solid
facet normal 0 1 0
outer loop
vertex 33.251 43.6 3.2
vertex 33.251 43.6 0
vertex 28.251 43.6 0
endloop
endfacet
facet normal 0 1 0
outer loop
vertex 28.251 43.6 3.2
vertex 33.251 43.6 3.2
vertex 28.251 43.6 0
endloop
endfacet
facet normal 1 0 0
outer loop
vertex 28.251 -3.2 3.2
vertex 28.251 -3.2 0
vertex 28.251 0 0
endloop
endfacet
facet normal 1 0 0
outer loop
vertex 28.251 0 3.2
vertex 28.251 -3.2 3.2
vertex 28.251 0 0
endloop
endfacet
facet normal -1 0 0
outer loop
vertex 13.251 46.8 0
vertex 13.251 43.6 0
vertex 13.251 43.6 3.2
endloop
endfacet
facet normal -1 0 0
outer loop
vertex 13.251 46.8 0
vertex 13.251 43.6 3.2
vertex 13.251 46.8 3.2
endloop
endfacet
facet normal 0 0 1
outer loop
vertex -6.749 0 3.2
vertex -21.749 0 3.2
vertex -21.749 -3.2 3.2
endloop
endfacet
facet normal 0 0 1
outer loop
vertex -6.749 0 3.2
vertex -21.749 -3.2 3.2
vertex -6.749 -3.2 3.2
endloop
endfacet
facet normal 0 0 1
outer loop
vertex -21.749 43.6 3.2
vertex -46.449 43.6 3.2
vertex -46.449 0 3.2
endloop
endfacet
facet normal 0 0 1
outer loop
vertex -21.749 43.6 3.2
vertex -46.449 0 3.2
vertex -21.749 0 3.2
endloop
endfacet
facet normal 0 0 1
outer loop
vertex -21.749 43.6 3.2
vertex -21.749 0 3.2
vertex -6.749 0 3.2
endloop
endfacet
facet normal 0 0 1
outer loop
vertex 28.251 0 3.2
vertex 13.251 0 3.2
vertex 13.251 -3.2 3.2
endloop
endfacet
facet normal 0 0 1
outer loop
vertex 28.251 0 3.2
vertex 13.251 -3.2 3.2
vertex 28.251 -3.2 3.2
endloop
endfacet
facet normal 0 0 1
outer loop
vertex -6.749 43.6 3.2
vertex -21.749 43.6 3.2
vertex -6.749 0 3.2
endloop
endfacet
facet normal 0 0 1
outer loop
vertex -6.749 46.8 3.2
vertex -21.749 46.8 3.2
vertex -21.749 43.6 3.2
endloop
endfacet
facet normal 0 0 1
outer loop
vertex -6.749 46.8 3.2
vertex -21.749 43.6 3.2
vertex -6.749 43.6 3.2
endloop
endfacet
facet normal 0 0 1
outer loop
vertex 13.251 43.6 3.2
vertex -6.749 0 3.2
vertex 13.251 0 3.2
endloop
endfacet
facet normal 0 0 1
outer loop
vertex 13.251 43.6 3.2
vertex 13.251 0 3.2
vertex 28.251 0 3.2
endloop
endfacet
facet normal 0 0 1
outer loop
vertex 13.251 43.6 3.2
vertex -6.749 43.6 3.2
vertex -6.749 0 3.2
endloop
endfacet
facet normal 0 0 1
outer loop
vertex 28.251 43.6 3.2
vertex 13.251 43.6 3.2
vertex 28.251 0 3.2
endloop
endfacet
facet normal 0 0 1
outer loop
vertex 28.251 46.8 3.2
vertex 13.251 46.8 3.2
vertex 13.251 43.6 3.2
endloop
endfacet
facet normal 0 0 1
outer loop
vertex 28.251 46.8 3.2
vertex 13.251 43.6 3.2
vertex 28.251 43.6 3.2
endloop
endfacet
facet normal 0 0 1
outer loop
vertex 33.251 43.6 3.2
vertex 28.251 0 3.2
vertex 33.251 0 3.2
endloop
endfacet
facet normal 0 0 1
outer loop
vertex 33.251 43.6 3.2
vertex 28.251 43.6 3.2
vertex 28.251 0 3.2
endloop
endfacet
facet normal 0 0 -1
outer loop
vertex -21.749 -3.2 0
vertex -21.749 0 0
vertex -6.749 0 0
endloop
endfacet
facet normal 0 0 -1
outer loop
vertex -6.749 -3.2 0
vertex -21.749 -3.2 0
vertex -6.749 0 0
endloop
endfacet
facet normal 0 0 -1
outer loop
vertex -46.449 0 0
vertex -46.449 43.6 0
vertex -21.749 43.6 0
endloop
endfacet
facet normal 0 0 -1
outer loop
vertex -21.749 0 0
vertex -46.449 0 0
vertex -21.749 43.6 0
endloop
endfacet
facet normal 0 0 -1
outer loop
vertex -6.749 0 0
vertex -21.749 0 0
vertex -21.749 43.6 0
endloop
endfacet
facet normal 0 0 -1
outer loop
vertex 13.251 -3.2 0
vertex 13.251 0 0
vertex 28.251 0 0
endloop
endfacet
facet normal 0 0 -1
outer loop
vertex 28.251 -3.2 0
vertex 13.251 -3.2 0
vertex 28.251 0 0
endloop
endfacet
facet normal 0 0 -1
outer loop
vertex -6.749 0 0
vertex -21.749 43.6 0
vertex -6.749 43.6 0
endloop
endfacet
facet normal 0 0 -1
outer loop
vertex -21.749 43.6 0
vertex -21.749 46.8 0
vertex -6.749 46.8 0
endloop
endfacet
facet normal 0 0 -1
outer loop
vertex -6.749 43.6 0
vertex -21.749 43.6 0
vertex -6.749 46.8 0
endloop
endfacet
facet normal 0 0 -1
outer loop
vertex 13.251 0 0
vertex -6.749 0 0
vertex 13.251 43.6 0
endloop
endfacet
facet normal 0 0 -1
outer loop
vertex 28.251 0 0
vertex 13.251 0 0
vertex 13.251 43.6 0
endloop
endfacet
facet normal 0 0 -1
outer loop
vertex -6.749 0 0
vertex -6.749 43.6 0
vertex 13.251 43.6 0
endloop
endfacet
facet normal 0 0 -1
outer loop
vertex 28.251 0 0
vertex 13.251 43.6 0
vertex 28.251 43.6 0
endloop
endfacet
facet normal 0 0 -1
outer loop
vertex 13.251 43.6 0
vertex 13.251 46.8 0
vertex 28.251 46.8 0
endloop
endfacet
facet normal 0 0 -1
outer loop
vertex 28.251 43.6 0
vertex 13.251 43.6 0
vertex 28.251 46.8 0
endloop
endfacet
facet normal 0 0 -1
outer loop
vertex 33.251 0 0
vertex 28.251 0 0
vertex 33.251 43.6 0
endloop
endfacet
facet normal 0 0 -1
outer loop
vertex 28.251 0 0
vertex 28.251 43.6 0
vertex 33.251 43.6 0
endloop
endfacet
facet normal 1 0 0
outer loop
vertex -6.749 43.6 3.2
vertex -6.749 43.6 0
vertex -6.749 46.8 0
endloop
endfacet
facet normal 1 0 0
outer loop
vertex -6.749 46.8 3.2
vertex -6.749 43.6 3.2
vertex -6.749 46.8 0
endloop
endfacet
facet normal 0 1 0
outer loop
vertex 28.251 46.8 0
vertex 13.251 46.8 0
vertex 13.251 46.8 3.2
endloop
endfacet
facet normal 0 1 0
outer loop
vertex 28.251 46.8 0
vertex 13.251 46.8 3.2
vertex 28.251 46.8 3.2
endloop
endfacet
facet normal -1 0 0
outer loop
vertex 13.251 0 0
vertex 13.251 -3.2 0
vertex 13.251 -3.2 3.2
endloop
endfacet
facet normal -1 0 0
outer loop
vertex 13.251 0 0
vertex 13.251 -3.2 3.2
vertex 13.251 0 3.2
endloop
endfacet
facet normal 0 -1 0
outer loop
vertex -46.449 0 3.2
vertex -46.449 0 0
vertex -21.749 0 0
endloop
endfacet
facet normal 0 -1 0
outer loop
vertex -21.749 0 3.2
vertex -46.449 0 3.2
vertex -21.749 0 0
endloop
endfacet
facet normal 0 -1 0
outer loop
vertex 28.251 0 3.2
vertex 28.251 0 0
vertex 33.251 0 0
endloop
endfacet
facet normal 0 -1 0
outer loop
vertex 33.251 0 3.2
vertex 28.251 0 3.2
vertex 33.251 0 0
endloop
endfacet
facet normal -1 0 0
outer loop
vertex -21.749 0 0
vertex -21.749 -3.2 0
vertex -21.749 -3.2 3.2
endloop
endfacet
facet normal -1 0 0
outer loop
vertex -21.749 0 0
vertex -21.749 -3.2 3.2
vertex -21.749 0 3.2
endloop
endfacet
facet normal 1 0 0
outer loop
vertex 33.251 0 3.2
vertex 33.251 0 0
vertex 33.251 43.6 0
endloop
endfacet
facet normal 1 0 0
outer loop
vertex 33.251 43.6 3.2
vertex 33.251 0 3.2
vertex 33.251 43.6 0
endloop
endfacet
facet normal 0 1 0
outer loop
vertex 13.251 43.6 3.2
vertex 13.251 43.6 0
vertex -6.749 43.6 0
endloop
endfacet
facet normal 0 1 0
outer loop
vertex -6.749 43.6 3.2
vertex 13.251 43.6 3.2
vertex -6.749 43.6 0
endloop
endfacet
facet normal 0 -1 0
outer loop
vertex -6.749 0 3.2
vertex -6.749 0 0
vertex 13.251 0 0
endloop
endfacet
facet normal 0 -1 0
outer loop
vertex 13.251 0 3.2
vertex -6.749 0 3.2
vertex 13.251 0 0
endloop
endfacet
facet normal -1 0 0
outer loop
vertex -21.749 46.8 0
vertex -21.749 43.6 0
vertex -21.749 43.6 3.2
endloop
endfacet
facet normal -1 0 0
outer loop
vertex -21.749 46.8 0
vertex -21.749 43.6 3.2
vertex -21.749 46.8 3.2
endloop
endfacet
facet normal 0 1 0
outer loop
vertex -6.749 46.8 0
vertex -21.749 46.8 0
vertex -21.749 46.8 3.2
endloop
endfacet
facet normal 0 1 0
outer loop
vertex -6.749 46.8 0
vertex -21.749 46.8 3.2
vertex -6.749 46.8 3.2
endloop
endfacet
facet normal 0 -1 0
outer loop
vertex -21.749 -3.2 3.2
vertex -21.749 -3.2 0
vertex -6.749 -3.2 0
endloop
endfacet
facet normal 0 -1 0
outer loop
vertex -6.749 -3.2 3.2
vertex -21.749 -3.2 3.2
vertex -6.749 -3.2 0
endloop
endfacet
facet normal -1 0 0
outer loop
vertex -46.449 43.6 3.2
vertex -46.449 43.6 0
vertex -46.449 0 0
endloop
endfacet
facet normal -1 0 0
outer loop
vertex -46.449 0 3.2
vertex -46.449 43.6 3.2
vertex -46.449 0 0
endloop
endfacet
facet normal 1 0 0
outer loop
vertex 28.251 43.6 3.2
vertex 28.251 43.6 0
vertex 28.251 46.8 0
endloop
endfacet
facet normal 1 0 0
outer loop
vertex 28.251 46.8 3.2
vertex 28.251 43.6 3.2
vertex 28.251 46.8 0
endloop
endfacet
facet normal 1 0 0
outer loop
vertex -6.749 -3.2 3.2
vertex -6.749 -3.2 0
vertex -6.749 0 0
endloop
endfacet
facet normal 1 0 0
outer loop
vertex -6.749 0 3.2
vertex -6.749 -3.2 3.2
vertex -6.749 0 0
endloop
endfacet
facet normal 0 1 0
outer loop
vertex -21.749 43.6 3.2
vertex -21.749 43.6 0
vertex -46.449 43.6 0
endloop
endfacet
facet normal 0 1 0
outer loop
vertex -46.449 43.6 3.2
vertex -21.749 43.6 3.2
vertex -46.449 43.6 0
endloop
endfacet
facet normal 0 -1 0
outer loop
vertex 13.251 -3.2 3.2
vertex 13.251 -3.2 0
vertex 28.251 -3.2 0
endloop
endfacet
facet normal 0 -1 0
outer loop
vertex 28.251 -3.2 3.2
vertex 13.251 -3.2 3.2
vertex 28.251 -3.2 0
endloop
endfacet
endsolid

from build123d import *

# Parameters (mm, degrees)
F0_W     = 15
F0_H     = 3.2
F1_DEPTH = 3.2


with BuildPart() as f1:
    # F0 (on Top) → F1 (new body)
    with BuildSketch(Plane.XY):
        Polygon((28.25105, 0), (33.25105, 0), (33.25105, 43.6), (28.25105, 43.6), (13.25105, 43.6), (-6.74895, 43.6), (-21.74895, 43.6), (-46.44895, 43.6), (-46.44895, 0), (-21.74895, 0), (-6.74895, 0), (13.25105, 0), align=None)
        with Locations((20.75105, -1.6)):
            Rectangle(F0_W, F0_H)
        with Locations((20.75105, 45.2)):
            Rectangle(F0_W, F0_H)
        with Locations((-14.24895, -1.6)):
            Rectangle(F0_W, F0_H)
        with Locations((-14.24895, 45.2)):
            Rectangle(F0_W, F0_H)
    extrude(amount=F1_DEPTH)


solid = f1.part
